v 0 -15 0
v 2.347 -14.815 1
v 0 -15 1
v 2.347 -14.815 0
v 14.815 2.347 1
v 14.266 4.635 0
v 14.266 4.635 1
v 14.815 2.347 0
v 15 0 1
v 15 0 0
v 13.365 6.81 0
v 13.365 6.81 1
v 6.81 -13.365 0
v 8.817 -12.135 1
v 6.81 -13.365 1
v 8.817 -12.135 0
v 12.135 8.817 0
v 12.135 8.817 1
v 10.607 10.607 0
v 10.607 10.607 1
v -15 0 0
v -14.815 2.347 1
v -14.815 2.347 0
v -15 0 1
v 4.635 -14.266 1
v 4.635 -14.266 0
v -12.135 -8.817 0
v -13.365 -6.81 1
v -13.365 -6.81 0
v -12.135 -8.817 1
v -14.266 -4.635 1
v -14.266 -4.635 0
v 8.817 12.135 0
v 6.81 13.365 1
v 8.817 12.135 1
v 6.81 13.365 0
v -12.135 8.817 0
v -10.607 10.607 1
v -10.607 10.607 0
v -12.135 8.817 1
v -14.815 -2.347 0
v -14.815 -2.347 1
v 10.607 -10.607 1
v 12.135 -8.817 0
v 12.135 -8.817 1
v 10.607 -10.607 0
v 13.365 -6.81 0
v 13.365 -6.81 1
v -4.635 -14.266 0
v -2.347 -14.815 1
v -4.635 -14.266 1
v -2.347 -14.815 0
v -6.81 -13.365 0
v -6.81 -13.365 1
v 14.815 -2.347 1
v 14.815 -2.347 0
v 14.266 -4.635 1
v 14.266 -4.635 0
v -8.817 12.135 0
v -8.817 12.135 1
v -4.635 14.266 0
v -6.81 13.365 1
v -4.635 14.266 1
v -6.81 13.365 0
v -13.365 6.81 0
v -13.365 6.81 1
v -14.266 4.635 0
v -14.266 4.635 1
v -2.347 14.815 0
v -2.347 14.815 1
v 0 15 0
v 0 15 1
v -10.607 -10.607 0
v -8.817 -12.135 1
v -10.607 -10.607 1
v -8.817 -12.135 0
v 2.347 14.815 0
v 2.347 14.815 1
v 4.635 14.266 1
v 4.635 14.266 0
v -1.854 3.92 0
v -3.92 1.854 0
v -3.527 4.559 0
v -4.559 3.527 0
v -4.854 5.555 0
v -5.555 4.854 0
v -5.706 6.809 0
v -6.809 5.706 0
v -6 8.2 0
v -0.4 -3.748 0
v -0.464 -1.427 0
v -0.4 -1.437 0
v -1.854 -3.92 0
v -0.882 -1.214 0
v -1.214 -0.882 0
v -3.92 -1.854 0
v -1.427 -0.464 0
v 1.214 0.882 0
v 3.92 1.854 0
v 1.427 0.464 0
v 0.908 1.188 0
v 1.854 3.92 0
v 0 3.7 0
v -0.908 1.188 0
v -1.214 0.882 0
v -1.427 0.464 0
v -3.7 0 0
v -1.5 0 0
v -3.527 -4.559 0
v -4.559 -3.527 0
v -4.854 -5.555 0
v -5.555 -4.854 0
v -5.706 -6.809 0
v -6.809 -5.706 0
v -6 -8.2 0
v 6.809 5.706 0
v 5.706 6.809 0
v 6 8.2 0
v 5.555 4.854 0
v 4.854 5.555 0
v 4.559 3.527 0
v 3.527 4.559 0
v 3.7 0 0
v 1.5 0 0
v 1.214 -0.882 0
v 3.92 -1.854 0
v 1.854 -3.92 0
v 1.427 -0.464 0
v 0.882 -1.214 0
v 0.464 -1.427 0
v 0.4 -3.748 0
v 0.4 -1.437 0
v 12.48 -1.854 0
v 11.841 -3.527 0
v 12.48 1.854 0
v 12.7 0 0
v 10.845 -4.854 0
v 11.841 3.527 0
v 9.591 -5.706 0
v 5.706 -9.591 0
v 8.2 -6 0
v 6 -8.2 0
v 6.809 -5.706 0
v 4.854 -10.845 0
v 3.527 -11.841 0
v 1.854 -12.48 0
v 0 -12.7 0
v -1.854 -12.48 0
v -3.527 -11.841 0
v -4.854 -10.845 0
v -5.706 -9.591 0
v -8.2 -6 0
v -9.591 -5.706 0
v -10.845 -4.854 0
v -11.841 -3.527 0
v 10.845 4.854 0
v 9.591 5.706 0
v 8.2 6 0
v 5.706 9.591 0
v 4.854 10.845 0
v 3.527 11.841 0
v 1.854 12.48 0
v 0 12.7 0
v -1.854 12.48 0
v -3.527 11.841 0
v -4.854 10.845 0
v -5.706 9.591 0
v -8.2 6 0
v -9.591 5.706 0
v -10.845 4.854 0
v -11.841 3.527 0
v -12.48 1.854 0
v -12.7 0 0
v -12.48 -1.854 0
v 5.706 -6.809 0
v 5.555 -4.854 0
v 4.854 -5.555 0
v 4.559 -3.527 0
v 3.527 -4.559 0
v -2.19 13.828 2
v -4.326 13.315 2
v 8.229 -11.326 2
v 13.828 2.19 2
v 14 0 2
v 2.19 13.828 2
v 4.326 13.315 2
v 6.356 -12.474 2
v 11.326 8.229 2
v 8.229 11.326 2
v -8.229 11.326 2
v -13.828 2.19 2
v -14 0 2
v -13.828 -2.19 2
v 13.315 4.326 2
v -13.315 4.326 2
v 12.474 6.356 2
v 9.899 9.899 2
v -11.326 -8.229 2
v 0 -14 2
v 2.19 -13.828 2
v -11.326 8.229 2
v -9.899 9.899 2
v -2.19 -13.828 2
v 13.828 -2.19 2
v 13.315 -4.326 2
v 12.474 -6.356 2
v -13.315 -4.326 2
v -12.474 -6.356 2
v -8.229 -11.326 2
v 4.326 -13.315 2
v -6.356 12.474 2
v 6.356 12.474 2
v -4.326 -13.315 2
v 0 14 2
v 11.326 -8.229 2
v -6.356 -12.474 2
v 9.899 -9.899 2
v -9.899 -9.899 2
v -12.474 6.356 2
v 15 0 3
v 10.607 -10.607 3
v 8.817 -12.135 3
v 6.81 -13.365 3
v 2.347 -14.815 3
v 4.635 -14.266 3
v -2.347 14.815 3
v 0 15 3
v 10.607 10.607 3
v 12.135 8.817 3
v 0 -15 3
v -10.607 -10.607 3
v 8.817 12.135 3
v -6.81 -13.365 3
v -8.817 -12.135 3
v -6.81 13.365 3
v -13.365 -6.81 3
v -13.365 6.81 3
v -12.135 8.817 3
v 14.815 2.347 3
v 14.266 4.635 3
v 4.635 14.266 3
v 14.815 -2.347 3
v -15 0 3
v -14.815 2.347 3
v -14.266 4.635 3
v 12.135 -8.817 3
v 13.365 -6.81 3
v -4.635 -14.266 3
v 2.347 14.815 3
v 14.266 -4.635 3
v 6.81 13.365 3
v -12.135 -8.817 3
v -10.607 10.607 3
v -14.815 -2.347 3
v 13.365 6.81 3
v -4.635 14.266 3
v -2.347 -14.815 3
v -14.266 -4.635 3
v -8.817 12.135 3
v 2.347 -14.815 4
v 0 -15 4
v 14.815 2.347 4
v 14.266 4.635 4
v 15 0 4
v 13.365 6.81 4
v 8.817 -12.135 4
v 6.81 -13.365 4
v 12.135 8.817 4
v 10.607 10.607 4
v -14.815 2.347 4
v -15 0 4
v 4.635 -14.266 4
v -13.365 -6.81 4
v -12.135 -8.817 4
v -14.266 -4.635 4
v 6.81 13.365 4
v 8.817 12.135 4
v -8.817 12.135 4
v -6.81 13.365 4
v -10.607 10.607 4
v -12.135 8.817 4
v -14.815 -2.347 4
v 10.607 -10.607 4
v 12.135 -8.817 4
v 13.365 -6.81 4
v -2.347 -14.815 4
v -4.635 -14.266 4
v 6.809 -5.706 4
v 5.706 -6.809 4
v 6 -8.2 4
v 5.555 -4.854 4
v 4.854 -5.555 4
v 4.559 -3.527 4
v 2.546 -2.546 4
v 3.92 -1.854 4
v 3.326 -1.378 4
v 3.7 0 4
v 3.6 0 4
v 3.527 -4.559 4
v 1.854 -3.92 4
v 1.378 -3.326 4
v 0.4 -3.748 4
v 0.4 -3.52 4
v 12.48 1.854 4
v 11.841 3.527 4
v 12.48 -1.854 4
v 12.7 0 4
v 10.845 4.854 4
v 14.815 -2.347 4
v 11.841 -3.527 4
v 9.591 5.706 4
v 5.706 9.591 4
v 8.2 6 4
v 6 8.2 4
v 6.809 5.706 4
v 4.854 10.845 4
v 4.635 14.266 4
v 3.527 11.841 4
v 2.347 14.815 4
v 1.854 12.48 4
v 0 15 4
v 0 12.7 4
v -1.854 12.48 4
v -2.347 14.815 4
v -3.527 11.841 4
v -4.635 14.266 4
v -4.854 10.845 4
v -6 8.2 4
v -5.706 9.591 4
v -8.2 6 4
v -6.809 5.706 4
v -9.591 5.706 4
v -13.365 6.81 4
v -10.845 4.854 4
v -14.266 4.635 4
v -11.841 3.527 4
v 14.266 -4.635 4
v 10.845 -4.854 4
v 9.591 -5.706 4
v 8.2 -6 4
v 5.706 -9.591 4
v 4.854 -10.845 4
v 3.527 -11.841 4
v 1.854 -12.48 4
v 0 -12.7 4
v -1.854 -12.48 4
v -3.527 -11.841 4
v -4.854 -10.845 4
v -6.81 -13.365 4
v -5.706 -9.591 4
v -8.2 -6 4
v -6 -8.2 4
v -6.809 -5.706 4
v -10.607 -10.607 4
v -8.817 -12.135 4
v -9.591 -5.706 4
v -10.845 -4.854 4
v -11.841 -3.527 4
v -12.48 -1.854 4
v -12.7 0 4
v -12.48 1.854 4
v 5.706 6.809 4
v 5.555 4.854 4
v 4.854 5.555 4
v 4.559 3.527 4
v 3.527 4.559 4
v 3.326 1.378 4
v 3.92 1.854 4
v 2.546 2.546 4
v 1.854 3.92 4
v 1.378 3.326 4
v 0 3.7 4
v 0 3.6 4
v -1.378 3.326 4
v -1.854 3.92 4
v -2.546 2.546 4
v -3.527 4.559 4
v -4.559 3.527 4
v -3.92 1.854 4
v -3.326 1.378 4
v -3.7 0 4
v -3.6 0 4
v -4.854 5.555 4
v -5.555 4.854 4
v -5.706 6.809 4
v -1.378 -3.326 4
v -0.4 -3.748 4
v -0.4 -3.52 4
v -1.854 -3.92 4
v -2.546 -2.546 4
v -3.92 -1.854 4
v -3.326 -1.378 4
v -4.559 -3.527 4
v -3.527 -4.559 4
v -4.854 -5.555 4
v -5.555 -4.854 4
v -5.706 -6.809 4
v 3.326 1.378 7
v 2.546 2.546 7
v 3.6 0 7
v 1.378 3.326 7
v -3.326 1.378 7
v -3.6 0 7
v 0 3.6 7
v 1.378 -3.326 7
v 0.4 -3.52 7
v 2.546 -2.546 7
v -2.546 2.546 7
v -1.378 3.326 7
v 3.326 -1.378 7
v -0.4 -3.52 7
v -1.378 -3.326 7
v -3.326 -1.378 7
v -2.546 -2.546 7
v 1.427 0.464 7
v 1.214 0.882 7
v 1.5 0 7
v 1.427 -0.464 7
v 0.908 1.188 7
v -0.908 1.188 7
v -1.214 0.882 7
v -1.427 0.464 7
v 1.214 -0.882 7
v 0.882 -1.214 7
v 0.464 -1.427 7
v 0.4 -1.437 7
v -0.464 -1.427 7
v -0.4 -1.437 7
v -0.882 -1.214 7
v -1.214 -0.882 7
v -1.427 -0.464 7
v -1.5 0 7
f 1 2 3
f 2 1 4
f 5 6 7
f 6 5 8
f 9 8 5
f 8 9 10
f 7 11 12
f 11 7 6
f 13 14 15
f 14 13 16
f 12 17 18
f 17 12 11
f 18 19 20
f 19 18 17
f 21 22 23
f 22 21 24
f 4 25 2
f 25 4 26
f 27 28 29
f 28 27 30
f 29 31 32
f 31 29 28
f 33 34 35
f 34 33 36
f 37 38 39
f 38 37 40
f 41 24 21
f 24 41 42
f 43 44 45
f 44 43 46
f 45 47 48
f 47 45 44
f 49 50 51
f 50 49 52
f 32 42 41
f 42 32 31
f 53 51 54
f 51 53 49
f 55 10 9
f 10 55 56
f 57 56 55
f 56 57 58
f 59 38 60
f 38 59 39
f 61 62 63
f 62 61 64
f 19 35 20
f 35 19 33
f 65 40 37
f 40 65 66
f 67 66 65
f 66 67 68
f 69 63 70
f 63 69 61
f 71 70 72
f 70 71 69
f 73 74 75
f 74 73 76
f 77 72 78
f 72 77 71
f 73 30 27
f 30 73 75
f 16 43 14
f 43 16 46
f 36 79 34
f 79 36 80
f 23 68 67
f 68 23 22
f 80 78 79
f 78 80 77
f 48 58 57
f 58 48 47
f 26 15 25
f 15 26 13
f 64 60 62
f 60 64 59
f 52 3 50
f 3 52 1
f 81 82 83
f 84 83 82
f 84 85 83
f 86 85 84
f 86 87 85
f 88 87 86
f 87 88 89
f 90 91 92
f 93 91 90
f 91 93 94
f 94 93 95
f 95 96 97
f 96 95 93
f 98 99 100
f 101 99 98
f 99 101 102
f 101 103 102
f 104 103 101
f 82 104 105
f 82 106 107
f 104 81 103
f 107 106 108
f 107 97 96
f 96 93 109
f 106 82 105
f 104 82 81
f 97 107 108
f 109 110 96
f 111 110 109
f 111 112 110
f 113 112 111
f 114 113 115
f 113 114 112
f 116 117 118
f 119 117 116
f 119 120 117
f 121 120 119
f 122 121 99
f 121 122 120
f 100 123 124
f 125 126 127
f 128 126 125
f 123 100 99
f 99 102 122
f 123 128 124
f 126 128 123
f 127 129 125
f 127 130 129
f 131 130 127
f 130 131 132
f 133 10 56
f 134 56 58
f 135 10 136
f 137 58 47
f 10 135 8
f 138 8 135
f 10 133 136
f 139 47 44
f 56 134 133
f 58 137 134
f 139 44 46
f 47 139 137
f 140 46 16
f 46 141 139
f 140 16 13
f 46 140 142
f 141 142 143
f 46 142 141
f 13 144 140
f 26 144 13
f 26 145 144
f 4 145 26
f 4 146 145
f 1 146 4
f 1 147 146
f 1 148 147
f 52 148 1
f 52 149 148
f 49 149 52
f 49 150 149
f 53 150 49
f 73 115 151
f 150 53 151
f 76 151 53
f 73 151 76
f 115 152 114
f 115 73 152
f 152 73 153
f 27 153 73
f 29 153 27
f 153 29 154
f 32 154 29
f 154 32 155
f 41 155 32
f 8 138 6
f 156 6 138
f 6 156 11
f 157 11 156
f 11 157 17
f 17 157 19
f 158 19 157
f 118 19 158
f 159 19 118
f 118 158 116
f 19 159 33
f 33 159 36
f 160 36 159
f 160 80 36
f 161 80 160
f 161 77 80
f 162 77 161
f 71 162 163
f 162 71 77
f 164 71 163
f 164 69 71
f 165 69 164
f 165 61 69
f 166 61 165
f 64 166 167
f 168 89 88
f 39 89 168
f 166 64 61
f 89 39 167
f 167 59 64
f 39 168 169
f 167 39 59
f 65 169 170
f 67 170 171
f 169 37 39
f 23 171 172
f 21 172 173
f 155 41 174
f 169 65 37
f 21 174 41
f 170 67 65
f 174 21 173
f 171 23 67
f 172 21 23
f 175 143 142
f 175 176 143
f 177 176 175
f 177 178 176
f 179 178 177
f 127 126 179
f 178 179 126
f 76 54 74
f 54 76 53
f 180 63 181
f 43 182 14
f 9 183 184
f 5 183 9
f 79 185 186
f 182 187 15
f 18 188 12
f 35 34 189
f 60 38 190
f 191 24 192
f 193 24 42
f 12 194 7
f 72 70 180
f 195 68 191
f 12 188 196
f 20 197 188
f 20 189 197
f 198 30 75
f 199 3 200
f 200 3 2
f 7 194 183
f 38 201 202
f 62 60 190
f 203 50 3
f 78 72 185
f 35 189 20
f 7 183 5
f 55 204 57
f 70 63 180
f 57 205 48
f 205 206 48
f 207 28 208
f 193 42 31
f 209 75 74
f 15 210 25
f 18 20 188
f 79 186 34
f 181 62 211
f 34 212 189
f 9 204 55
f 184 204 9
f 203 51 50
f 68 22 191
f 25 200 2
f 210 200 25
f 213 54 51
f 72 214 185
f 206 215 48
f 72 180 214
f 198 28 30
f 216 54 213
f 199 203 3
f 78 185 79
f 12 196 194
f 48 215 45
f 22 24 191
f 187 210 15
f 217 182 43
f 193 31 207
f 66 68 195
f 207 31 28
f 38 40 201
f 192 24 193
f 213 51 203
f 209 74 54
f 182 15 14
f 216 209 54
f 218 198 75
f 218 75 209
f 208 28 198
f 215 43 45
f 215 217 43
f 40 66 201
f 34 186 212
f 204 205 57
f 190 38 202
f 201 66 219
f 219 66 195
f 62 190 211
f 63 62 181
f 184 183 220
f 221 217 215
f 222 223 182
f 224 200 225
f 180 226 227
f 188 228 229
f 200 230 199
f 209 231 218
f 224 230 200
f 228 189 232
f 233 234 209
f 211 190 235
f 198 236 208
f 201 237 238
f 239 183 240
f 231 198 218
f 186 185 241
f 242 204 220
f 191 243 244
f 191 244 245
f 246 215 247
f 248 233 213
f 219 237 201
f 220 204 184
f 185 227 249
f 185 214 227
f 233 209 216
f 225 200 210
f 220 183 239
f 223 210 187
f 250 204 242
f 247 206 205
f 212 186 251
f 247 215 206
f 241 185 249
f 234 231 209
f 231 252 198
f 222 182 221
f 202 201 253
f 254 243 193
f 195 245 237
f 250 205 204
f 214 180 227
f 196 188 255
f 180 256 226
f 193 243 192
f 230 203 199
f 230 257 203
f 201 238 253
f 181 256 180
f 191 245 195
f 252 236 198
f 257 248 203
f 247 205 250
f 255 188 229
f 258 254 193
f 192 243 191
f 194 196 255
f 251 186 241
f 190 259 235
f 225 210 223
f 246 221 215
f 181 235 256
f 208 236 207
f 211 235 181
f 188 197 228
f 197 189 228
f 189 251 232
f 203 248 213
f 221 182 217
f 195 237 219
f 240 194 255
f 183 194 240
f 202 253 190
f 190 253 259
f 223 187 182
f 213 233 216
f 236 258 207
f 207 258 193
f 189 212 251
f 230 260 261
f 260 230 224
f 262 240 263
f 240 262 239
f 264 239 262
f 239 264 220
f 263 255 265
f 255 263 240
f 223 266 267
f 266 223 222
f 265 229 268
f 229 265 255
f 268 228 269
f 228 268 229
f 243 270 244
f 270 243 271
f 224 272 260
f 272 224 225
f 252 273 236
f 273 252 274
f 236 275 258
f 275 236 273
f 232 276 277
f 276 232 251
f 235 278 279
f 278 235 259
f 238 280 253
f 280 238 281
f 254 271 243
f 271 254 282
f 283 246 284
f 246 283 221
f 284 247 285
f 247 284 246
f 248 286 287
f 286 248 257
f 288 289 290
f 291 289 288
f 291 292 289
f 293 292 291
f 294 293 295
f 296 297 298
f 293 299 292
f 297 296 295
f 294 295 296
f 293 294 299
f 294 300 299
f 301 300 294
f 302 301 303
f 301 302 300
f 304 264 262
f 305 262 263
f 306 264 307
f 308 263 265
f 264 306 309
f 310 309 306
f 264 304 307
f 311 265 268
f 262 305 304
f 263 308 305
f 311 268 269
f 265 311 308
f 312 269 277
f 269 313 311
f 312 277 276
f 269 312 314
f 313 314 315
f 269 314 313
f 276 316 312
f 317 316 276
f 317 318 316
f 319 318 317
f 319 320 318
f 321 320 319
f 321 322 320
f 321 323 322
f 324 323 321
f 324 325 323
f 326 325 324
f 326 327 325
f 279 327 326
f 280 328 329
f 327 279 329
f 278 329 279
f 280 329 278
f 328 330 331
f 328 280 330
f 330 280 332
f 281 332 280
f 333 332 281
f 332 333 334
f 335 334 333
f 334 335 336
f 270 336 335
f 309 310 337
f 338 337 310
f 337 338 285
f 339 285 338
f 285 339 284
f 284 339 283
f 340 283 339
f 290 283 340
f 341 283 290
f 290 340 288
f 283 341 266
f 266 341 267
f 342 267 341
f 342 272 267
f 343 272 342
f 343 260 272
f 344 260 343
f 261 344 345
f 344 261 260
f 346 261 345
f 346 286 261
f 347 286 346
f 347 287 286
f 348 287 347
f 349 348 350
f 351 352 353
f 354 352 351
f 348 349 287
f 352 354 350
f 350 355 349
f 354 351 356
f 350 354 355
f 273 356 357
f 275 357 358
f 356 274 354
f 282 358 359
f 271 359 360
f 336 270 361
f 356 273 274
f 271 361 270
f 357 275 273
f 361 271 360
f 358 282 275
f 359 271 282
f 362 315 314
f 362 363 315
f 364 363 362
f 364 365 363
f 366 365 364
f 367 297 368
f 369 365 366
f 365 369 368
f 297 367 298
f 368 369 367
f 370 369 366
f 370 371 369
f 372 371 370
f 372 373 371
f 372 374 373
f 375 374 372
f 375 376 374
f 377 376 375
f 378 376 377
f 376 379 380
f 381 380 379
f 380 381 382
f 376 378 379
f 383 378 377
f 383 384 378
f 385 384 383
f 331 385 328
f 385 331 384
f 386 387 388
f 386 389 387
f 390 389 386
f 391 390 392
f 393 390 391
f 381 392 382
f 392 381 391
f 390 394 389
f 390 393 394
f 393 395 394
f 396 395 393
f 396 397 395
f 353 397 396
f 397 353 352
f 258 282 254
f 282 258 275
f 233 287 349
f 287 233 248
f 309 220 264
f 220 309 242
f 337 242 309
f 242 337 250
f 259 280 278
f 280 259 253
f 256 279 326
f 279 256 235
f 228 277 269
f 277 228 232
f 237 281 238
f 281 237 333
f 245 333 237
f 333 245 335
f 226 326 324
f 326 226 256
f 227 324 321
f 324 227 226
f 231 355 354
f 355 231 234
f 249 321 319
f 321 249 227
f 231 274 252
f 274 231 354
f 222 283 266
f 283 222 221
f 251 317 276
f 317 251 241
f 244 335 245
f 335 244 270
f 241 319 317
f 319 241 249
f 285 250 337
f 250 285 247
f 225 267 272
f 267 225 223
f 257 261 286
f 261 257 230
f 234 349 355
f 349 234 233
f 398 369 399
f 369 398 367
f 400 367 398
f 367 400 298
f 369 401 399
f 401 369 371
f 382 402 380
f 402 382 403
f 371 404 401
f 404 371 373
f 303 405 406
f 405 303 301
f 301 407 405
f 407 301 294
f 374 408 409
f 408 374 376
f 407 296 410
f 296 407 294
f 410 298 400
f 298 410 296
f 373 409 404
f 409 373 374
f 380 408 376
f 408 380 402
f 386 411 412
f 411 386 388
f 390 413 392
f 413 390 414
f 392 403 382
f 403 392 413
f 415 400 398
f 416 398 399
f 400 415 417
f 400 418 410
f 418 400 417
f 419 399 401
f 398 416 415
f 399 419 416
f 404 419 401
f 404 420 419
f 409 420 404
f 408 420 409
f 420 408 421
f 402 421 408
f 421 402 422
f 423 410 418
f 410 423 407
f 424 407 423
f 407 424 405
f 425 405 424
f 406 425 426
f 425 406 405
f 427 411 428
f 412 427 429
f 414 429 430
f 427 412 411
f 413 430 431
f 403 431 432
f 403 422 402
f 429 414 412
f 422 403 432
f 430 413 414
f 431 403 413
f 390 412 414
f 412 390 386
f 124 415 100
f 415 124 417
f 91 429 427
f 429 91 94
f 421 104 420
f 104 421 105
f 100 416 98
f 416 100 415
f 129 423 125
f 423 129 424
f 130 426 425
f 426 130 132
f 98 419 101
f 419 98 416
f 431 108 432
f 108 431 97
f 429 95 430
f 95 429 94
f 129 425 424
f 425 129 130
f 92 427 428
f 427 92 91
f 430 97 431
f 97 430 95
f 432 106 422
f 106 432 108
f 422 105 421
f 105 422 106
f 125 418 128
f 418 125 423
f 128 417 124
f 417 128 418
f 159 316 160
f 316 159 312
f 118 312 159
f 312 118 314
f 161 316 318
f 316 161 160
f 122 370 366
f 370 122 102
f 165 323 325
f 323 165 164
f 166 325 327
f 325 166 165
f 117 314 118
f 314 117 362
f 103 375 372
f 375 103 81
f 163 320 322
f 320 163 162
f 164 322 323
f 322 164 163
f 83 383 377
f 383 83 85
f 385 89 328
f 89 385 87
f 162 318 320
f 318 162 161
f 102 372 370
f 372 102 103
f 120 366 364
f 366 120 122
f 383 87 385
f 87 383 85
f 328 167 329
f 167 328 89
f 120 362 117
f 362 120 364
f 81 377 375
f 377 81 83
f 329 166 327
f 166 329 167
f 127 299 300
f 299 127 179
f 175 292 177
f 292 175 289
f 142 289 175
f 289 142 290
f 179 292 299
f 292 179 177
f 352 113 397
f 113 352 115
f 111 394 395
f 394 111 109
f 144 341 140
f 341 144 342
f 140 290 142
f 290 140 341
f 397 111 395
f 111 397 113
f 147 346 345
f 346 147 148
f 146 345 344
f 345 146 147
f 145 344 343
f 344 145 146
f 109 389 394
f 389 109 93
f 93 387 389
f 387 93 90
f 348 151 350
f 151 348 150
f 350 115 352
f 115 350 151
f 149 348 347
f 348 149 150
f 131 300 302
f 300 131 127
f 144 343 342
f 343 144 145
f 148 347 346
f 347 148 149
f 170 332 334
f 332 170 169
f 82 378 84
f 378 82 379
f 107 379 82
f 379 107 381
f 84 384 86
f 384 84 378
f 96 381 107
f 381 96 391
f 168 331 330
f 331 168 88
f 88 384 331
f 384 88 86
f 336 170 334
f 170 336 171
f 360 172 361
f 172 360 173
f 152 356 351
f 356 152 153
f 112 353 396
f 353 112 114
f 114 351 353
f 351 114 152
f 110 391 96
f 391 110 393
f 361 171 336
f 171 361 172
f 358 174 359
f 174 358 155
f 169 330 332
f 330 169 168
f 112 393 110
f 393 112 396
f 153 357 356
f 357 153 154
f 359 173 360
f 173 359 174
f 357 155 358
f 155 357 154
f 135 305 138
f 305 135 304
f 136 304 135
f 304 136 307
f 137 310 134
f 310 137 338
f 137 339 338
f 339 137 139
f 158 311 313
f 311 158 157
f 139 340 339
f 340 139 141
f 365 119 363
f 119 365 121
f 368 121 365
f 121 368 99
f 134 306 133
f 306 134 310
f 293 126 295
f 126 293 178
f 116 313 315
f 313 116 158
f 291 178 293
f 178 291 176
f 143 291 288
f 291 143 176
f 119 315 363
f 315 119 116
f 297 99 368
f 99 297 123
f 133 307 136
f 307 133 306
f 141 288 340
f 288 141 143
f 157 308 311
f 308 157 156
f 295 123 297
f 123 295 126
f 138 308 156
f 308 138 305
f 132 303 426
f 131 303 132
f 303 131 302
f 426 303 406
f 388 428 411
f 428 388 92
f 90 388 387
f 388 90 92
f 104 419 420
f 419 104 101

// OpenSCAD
// Rueda de 32mm (con junta tórica) para Sapoconcho
// o cualquier micromotor de 3mm de eje

union()
{
    difference()
    {

        // base de la rueda con cuatro capas
        union()
        {
            r_ext=15;
            cylinder(h=1,r1=r_ext,r2=r_ext,$fn=40);
            translate([0,0,1])
            cylinder(h=1,r1=r_ext,r2=r_ext-1,$fn=40);
            translate([0,0,2])
            cylinder(h=1,r1=r_ext-1,r2=r_ext,$fn=40);
            translate([0,0,3])
            cylinder(h=1,r1=r_ext,r2=r_ext,$fn=40);
            translate([0,0,4])
            cylinder(h=3,r1=3.6,r2=3.6,$fn=16);
        }
        
        // eje para el motor (3mm)
        r_eje=1.5; //aumentar segun impresora
        translate([0,0,-1])
        cylinder(h=9,r1=r_eje,r2=r_eje,$fn=20);
        
        // agujeros para aligerar el diseño
        r=8.2;    
        translate([0,r,-1]) scale([1.2,0.9,1])
        cylinder(h=6,r1=5,r2=5,$fn=20);
        translate([0,-r,-1]) scale([1.2,0.9,1])
        cylinder(h=6,r1=5,r2=5,$fn=20);
        translate([-r,0,-1]) scale([0.9,1.2,1])
        cylinder(h=6,r1=5,r2=5,$fn=20);
        translate([r,0,-1]) scale([0.9,1.2,1])
        cylinder(h=6,r1=5,r2=5,$fn=20);
    
        // hendidura lateral del eje
        translate([-.4,-4,-1]) scale ([.2,1,3])
        cube(4);
    }

    // muesca del eje (0.5mm)
    translate([0,1.4375,3.5]) scale ([1,.125,1.75]) //modificar el y del translate segun impresora
    cube(4,center=true);
}
